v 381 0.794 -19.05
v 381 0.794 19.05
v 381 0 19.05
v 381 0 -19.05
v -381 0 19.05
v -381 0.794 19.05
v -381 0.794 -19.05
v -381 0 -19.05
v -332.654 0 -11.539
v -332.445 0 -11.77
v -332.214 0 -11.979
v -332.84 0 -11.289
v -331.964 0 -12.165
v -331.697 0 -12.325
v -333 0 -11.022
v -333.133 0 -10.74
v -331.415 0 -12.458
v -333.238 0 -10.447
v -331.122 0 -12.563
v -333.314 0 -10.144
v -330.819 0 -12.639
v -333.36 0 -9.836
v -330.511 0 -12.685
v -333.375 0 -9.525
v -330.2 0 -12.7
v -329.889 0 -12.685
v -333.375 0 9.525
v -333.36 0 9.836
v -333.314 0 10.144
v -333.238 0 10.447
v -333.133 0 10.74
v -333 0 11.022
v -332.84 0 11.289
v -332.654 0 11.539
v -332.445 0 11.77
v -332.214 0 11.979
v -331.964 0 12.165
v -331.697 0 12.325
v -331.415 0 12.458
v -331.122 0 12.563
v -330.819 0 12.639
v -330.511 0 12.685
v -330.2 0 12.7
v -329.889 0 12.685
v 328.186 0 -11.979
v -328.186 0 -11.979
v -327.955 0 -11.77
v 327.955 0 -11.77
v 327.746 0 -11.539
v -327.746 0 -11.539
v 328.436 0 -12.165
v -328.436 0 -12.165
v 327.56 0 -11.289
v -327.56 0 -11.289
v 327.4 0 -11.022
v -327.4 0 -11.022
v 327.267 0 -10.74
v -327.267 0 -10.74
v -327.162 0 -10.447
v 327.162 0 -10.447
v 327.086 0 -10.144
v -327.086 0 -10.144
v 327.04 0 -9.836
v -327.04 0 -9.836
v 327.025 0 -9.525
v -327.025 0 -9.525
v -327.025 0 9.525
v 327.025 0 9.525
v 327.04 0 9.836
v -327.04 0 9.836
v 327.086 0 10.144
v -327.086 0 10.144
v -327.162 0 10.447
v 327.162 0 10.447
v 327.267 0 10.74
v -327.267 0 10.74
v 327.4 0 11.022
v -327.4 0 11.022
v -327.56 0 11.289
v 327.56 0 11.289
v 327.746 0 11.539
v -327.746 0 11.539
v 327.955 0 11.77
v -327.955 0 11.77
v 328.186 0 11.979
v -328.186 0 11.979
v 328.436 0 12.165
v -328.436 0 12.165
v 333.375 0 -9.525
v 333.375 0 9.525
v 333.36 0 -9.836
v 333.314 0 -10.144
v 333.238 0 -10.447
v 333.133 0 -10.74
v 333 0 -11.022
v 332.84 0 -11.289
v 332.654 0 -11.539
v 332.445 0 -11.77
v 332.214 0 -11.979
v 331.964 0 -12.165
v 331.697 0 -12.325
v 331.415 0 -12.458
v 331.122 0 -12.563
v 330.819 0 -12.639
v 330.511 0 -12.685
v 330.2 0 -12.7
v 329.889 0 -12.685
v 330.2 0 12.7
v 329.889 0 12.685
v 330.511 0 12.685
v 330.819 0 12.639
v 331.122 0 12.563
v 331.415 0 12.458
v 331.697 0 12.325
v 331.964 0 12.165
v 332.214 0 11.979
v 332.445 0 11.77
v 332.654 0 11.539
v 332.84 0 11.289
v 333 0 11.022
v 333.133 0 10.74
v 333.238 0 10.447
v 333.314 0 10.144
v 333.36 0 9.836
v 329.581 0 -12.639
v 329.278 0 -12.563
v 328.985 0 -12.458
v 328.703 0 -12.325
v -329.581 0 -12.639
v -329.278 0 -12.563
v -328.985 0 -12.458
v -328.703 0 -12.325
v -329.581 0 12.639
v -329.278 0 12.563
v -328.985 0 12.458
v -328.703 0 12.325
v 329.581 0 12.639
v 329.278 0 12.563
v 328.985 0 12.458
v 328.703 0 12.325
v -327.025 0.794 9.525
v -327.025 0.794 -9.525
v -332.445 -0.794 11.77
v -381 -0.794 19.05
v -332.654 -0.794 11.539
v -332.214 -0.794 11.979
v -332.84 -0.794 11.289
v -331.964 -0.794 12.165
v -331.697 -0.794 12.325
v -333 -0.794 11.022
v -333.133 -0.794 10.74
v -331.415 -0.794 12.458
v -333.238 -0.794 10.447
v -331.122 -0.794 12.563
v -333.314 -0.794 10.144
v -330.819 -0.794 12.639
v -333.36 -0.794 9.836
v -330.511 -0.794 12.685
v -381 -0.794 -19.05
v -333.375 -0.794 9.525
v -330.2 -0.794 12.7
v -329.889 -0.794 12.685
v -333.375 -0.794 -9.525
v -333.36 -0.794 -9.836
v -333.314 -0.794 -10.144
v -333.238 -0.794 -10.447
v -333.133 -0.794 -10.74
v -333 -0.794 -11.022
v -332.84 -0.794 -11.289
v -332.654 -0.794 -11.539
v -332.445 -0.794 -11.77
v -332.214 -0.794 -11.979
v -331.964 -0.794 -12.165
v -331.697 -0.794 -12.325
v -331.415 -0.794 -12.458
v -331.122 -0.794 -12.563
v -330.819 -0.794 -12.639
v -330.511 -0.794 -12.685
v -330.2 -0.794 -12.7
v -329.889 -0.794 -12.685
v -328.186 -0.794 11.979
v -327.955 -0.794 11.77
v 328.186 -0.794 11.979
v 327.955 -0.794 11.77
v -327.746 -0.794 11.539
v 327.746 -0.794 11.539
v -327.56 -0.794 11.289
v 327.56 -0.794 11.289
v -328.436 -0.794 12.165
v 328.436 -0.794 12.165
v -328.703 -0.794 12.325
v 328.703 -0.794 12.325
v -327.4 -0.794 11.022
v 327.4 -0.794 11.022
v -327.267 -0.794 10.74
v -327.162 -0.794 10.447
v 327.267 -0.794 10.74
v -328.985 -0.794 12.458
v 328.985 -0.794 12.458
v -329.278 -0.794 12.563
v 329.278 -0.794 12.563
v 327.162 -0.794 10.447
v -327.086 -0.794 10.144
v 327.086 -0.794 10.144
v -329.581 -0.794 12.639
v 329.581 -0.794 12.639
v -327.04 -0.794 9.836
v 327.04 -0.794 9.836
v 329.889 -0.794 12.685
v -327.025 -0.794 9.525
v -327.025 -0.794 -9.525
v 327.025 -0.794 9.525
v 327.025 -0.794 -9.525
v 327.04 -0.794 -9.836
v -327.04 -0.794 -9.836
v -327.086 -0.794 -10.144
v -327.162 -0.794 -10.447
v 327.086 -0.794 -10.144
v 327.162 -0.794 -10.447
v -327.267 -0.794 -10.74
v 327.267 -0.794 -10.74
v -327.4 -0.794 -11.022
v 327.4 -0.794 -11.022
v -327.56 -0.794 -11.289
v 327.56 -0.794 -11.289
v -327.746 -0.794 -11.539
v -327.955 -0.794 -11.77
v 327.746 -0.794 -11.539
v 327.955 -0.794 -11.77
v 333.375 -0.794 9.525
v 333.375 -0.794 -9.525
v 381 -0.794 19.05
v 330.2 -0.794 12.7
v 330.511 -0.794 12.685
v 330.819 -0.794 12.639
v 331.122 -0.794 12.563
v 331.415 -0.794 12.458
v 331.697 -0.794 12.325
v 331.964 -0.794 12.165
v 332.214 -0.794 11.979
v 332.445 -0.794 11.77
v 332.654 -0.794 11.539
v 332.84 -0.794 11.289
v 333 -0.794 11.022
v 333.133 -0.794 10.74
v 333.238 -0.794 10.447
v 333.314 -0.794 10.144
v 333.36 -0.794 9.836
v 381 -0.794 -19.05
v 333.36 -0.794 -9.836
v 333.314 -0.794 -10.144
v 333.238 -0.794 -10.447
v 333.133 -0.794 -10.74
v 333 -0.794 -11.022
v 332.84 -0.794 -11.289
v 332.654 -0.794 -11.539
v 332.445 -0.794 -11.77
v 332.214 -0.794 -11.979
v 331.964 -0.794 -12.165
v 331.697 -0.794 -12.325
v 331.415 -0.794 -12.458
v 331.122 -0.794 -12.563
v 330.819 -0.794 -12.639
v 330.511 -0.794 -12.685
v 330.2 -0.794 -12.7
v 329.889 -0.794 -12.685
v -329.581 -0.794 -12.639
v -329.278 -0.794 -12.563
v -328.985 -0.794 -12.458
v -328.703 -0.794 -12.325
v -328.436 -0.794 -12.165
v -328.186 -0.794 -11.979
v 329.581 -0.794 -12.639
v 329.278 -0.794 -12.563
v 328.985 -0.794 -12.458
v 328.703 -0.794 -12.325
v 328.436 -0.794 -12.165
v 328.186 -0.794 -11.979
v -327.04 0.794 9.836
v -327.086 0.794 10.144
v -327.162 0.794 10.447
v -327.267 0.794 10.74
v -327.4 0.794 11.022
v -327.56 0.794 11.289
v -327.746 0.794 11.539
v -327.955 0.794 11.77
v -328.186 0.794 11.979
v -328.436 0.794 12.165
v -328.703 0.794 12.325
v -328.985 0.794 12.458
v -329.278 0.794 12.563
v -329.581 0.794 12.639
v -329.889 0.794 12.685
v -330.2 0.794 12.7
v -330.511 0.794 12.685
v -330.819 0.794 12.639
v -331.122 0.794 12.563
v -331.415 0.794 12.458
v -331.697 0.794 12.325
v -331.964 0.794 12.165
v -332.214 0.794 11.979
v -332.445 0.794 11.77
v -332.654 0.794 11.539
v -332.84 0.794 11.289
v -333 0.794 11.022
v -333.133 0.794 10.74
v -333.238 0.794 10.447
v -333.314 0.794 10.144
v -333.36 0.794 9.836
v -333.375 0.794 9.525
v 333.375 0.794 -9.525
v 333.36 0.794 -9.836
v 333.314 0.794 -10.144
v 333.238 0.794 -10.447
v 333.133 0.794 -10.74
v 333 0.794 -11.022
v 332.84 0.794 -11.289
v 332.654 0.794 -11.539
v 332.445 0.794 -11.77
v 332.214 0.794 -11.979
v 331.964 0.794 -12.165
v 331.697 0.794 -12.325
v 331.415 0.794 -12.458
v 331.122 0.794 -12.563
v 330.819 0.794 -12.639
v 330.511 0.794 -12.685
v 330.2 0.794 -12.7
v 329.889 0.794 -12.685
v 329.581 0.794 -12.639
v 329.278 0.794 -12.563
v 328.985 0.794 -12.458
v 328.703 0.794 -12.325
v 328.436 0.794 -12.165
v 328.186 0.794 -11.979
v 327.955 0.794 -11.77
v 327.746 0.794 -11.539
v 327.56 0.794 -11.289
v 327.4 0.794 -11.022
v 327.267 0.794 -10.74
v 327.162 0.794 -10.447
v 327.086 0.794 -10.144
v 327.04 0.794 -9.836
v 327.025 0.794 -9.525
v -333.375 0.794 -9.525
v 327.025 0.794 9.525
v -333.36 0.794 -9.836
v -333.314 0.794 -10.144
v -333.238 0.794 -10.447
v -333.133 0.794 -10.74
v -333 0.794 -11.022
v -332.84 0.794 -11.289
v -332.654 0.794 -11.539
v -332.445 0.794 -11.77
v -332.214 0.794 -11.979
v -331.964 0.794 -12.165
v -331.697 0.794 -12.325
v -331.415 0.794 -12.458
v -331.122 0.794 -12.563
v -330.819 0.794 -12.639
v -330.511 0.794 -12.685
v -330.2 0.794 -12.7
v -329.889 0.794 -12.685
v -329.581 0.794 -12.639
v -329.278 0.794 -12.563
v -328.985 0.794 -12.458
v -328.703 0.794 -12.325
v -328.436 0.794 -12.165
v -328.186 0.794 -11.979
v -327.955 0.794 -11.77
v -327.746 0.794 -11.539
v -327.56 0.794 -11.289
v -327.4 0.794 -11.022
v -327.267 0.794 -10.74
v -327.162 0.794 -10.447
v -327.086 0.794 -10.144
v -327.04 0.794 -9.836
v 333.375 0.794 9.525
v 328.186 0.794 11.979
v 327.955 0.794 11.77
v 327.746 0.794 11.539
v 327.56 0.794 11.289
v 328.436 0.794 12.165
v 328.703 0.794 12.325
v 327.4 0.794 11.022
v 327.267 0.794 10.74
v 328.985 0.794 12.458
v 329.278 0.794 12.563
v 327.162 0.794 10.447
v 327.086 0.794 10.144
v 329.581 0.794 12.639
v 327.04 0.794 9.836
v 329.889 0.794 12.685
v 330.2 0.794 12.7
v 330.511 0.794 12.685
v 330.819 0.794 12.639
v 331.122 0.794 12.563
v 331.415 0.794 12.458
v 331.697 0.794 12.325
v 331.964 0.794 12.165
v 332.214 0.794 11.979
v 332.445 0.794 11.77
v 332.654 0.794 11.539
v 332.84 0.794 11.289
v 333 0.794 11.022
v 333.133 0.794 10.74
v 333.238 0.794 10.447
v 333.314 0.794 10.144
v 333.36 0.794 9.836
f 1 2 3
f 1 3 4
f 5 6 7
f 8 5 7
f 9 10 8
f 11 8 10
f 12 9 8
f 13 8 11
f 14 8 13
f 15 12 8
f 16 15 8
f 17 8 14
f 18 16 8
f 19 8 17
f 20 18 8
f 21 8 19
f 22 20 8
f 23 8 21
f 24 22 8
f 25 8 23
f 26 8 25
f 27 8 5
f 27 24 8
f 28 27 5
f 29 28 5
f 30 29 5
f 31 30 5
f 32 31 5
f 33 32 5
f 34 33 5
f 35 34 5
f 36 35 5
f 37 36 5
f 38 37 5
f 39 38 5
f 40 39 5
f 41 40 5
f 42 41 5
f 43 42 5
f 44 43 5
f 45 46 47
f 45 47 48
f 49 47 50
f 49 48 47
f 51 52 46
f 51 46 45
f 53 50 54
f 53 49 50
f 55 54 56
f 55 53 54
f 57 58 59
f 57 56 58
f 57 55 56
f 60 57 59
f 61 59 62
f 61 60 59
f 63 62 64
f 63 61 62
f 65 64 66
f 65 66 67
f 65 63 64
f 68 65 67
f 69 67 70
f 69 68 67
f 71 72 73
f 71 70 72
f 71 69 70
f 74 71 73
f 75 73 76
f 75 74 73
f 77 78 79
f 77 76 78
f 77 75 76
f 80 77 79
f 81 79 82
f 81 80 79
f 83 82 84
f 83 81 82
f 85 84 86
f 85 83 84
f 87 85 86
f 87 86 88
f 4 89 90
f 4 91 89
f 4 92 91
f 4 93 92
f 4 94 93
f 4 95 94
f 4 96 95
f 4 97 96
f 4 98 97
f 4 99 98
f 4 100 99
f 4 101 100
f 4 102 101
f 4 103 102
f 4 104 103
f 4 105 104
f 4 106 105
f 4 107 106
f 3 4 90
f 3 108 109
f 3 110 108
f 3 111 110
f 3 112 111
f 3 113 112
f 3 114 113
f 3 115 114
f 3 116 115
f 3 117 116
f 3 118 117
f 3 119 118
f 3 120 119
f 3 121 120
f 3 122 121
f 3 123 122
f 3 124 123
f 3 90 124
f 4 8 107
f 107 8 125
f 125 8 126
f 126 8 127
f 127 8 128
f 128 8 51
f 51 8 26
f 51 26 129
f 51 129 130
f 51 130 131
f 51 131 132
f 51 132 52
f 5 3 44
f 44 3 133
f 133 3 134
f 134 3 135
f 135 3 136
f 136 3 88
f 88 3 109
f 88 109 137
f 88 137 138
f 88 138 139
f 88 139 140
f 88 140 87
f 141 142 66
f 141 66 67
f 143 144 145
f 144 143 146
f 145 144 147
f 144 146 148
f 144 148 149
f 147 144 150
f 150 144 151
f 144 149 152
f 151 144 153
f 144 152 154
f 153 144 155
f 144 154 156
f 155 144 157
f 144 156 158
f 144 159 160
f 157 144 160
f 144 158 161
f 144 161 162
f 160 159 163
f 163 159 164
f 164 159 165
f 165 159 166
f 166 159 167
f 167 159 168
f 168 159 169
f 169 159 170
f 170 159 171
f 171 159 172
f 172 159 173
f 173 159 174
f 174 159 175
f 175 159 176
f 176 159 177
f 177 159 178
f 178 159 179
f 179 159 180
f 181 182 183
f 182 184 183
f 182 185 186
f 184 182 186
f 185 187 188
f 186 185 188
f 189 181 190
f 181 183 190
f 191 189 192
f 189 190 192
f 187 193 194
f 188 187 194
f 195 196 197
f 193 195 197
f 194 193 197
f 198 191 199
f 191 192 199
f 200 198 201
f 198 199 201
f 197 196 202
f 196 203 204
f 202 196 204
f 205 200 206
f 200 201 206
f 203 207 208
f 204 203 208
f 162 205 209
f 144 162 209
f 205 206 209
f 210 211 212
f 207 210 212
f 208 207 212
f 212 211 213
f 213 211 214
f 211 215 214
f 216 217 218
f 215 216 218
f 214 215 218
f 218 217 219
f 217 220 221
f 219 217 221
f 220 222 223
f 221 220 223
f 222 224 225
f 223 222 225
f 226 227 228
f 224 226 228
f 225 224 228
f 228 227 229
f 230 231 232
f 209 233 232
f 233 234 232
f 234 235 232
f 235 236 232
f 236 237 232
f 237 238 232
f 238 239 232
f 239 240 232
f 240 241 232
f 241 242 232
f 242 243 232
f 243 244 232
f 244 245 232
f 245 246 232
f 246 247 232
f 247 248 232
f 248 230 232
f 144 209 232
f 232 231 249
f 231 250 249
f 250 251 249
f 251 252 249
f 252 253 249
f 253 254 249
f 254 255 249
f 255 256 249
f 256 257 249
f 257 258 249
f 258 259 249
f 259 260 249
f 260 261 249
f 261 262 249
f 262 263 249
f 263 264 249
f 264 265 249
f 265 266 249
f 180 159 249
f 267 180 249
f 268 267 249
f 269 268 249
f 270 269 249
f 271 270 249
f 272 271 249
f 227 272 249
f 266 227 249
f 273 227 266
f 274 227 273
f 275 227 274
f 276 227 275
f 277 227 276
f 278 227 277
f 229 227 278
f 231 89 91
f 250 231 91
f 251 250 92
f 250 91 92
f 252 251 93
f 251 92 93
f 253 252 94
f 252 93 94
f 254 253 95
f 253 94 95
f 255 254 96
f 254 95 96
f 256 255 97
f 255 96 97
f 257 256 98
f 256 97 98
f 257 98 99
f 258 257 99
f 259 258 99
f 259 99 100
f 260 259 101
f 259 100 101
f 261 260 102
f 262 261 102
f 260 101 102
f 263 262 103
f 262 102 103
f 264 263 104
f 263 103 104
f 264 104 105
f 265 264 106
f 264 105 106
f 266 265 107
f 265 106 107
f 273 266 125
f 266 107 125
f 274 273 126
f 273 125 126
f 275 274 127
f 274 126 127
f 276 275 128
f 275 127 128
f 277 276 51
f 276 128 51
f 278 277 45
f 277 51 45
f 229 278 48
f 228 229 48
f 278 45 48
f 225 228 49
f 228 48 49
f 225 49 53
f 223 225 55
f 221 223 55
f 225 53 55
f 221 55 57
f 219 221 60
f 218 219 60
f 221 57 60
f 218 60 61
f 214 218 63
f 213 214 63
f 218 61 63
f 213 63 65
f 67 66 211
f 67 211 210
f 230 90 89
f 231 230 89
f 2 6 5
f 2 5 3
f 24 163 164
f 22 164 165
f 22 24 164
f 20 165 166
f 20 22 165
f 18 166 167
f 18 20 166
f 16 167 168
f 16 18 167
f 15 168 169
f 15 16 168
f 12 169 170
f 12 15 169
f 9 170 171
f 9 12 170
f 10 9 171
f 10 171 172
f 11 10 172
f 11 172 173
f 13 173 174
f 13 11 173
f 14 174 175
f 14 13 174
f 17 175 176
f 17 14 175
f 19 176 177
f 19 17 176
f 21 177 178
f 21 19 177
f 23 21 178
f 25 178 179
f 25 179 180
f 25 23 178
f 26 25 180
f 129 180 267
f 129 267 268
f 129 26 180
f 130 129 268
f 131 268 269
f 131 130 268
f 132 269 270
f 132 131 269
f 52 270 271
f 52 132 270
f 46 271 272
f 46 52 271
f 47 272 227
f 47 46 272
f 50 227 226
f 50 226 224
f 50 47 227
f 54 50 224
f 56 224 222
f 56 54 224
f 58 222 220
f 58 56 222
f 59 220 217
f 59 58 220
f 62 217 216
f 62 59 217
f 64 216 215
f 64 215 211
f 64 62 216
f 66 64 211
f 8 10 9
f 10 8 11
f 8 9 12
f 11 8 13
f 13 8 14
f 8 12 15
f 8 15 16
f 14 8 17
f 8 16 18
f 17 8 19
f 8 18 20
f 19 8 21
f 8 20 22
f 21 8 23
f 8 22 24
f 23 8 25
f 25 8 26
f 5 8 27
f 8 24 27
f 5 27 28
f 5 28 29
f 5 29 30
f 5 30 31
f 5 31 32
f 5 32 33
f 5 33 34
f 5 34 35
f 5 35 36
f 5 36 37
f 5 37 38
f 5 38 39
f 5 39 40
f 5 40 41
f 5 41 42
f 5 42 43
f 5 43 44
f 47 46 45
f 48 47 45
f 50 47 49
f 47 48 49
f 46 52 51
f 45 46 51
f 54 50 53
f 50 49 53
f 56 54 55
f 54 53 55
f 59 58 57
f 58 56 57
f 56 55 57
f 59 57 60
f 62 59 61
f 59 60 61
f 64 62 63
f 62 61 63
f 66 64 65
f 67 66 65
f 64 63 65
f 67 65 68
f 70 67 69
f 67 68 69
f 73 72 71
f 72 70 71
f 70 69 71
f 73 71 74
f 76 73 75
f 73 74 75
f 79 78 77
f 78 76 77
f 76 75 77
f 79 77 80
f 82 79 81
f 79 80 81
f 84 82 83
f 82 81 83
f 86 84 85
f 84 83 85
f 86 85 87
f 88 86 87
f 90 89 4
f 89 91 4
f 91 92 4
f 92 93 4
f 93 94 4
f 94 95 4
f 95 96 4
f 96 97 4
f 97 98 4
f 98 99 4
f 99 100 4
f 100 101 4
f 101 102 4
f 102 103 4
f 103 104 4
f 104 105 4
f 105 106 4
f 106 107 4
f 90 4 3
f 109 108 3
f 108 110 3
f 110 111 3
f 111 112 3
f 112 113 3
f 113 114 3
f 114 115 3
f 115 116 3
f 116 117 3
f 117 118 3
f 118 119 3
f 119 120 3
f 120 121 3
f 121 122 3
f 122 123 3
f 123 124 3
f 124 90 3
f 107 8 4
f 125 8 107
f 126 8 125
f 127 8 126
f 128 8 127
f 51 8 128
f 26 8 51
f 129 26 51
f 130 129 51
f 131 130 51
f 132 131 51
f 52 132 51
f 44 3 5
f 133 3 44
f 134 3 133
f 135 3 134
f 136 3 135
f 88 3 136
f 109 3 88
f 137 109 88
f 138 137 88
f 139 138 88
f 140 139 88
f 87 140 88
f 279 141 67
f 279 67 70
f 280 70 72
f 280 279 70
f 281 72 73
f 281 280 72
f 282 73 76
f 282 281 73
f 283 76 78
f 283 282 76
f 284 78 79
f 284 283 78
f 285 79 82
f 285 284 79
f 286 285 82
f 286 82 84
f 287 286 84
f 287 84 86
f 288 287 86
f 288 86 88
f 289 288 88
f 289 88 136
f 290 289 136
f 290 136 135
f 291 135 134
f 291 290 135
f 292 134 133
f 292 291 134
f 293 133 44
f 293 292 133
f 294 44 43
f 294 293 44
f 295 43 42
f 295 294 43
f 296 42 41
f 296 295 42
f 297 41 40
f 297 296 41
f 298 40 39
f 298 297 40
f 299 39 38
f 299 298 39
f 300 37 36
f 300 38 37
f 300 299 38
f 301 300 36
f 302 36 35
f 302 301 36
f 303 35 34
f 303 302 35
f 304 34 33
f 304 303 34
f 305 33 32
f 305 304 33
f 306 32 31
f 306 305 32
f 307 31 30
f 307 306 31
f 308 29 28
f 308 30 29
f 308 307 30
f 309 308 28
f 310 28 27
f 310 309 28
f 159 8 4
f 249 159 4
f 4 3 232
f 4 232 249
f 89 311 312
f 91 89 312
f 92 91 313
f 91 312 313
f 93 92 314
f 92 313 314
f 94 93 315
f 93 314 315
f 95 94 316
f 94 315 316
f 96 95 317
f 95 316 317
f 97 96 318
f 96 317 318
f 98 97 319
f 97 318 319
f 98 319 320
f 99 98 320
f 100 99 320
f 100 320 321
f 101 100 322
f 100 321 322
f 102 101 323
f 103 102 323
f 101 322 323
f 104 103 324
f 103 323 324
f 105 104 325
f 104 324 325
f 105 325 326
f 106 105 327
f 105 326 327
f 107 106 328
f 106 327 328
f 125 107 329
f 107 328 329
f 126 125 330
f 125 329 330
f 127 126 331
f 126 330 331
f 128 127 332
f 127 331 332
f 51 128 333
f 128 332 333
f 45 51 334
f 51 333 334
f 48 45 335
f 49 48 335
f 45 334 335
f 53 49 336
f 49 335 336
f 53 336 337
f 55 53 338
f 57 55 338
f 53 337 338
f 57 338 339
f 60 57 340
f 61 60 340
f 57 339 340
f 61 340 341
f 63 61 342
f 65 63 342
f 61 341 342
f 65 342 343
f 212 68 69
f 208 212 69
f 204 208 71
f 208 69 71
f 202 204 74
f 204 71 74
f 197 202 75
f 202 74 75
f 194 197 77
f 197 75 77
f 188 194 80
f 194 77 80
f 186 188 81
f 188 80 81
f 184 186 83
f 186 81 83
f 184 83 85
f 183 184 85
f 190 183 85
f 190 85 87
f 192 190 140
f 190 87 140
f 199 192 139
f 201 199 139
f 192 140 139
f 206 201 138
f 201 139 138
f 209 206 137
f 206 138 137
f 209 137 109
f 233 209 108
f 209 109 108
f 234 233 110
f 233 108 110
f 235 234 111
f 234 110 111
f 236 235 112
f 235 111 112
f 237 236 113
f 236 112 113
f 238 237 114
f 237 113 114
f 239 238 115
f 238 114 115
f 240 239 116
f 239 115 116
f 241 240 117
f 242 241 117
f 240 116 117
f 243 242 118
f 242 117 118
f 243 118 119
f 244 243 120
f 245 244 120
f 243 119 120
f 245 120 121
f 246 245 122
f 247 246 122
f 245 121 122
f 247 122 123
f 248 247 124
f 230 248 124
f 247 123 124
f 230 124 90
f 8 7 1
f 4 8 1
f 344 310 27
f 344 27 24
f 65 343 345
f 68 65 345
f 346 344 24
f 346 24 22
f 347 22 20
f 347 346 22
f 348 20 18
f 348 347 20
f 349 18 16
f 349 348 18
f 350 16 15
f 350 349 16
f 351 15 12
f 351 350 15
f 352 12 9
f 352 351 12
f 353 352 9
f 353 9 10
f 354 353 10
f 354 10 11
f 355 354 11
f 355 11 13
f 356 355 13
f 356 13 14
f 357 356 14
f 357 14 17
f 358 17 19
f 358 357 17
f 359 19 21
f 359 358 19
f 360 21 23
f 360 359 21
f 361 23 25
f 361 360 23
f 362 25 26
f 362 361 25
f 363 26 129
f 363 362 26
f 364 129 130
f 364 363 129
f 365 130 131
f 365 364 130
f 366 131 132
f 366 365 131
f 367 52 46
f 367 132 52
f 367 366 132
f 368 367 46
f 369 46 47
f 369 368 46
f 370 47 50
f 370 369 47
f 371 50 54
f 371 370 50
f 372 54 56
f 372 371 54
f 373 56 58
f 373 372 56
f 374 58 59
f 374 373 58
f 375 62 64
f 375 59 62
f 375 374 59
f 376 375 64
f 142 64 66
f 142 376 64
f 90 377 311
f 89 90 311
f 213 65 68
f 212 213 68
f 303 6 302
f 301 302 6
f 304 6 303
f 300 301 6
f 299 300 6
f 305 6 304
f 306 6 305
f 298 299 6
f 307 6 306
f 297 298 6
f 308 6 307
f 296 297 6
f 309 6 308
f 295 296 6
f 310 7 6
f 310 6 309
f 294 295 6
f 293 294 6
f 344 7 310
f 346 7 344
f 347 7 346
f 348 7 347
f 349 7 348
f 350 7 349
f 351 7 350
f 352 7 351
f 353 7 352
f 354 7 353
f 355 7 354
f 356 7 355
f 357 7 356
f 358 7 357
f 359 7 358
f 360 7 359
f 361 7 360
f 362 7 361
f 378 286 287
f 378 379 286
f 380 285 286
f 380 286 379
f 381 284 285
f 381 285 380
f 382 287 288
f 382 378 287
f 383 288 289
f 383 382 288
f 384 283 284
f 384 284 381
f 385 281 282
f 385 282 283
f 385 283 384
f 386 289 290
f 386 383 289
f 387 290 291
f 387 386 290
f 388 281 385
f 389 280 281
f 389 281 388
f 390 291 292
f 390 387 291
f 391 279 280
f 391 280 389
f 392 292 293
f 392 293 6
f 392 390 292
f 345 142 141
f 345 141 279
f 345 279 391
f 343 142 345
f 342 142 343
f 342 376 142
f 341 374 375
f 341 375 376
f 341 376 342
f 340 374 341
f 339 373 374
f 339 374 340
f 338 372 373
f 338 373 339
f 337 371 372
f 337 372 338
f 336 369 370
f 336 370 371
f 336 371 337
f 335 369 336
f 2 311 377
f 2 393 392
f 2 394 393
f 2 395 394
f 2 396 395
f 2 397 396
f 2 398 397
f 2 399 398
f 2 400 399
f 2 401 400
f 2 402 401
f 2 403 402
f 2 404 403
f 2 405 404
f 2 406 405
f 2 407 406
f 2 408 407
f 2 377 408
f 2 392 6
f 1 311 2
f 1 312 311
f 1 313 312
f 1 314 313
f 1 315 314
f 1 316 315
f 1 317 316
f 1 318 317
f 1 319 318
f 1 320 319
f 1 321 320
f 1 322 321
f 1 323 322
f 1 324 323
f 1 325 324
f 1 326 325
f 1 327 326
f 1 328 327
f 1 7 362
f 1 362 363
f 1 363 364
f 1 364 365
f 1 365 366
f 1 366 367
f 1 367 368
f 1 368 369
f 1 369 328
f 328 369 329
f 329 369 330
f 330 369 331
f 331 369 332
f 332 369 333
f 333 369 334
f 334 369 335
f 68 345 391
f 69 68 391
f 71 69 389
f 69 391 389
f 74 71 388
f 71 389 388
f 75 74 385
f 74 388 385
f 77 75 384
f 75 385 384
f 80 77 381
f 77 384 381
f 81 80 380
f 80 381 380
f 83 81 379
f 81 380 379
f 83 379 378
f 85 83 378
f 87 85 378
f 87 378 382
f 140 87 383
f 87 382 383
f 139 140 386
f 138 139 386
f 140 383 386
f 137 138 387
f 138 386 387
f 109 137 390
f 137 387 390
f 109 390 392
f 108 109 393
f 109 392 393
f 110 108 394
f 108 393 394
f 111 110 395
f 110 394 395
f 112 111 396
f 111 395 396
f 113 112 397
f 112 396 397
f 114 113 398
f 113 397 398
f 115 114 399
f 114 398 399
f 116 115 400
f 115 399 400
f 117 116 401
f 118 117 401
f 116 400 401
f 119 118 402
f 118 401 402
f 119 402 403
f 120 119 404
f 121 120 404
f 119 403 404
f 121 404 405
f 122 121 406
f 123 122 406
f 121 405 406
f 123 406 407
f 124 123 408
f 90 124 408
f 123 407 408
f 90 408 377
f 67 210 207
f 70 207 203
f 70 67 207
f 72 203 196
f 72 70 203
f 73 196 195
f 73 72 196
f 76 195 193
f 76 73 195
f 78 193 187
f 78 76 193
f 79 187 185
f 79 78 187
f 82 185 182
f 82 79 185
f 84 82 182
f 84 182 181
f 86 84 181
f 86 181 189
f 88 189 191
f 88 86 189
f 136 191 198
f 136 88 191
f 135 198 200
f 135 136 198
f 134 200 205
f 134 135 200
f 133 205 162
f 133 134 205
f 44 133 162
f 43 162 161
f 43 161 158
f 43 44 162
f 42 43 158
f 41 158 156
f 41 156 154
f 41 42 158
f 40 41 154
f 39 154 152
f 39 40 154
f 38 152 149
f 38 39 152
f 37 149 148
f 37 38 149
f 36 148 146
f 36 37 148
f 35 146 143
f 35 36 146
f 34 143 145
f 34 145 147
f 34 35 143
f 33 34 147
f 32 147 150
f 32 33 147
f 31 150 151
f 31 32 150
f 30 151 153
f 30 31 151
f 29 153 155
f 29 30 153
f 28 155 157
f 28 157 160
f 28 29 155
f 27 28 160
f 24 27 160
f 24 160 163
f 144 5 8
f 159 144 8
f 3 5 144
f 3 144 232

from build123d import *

# Parameters (mm, degrees)
SKETCH1_W           = 762
SKETCH1_H           = 38.1
BOSS_EXTRUDE1_DEPTH = 0.79375


with BuildPart() as part:
    # Sketch1 → Boss-Extrude1 (new body, symmetric)
    with BuildSketch(Plane(origin=(0, 0, 0), x_dir=(1, 0, 0), z_dir=(0, 1, 0))):
        Rectangle(SKETCH1_W, SKETCH1_H)
        with BuildLine():
            Line((-327.025, 9.525), (-327.025, -9.525))
            ThreePointArc((-327.025, -9.525), (-330.2, -12.7), (-333.375, -9.525))
            Line((-333.375, -9.525), (-333.375, 9.525))
            ThreePointArc((-333.375, 9.525), (-330.2, 12.7), (-327.025, 9.525))
        make_face(mode=Mode.SUBTRACT)
        with BuildLine():
            Line((327.025, 9.525), (327.025, -9.525))
            ThreePointArc((327.025, -9.525), (330.2, -12.7), (333.375, -9.525))
            Line((333.375, -9.525), (333.375, 9.525))
            ThreePointArc((333.375, 9.525), (330.2, 12.7), (327.025, 9.525))
        make_face(mode=Mode.SUBTRACT)
    extrude(amount=BOSS_EXTRUDE1_DEPTH, both=True)


with BuildPart() as body_2:
    # Split1: the piece on the far side of the plane
    add(part.part)
    split(bisect_by=Plane.ZX, keep=Keep.BOTTOM)


with BuildPart() as part_1:
    add(part.part)

    # Split1
    split(bisect_by=Plane.ZX, keep=Keep.TOP)


solid = Compound([body_2.part, part_1.part])
